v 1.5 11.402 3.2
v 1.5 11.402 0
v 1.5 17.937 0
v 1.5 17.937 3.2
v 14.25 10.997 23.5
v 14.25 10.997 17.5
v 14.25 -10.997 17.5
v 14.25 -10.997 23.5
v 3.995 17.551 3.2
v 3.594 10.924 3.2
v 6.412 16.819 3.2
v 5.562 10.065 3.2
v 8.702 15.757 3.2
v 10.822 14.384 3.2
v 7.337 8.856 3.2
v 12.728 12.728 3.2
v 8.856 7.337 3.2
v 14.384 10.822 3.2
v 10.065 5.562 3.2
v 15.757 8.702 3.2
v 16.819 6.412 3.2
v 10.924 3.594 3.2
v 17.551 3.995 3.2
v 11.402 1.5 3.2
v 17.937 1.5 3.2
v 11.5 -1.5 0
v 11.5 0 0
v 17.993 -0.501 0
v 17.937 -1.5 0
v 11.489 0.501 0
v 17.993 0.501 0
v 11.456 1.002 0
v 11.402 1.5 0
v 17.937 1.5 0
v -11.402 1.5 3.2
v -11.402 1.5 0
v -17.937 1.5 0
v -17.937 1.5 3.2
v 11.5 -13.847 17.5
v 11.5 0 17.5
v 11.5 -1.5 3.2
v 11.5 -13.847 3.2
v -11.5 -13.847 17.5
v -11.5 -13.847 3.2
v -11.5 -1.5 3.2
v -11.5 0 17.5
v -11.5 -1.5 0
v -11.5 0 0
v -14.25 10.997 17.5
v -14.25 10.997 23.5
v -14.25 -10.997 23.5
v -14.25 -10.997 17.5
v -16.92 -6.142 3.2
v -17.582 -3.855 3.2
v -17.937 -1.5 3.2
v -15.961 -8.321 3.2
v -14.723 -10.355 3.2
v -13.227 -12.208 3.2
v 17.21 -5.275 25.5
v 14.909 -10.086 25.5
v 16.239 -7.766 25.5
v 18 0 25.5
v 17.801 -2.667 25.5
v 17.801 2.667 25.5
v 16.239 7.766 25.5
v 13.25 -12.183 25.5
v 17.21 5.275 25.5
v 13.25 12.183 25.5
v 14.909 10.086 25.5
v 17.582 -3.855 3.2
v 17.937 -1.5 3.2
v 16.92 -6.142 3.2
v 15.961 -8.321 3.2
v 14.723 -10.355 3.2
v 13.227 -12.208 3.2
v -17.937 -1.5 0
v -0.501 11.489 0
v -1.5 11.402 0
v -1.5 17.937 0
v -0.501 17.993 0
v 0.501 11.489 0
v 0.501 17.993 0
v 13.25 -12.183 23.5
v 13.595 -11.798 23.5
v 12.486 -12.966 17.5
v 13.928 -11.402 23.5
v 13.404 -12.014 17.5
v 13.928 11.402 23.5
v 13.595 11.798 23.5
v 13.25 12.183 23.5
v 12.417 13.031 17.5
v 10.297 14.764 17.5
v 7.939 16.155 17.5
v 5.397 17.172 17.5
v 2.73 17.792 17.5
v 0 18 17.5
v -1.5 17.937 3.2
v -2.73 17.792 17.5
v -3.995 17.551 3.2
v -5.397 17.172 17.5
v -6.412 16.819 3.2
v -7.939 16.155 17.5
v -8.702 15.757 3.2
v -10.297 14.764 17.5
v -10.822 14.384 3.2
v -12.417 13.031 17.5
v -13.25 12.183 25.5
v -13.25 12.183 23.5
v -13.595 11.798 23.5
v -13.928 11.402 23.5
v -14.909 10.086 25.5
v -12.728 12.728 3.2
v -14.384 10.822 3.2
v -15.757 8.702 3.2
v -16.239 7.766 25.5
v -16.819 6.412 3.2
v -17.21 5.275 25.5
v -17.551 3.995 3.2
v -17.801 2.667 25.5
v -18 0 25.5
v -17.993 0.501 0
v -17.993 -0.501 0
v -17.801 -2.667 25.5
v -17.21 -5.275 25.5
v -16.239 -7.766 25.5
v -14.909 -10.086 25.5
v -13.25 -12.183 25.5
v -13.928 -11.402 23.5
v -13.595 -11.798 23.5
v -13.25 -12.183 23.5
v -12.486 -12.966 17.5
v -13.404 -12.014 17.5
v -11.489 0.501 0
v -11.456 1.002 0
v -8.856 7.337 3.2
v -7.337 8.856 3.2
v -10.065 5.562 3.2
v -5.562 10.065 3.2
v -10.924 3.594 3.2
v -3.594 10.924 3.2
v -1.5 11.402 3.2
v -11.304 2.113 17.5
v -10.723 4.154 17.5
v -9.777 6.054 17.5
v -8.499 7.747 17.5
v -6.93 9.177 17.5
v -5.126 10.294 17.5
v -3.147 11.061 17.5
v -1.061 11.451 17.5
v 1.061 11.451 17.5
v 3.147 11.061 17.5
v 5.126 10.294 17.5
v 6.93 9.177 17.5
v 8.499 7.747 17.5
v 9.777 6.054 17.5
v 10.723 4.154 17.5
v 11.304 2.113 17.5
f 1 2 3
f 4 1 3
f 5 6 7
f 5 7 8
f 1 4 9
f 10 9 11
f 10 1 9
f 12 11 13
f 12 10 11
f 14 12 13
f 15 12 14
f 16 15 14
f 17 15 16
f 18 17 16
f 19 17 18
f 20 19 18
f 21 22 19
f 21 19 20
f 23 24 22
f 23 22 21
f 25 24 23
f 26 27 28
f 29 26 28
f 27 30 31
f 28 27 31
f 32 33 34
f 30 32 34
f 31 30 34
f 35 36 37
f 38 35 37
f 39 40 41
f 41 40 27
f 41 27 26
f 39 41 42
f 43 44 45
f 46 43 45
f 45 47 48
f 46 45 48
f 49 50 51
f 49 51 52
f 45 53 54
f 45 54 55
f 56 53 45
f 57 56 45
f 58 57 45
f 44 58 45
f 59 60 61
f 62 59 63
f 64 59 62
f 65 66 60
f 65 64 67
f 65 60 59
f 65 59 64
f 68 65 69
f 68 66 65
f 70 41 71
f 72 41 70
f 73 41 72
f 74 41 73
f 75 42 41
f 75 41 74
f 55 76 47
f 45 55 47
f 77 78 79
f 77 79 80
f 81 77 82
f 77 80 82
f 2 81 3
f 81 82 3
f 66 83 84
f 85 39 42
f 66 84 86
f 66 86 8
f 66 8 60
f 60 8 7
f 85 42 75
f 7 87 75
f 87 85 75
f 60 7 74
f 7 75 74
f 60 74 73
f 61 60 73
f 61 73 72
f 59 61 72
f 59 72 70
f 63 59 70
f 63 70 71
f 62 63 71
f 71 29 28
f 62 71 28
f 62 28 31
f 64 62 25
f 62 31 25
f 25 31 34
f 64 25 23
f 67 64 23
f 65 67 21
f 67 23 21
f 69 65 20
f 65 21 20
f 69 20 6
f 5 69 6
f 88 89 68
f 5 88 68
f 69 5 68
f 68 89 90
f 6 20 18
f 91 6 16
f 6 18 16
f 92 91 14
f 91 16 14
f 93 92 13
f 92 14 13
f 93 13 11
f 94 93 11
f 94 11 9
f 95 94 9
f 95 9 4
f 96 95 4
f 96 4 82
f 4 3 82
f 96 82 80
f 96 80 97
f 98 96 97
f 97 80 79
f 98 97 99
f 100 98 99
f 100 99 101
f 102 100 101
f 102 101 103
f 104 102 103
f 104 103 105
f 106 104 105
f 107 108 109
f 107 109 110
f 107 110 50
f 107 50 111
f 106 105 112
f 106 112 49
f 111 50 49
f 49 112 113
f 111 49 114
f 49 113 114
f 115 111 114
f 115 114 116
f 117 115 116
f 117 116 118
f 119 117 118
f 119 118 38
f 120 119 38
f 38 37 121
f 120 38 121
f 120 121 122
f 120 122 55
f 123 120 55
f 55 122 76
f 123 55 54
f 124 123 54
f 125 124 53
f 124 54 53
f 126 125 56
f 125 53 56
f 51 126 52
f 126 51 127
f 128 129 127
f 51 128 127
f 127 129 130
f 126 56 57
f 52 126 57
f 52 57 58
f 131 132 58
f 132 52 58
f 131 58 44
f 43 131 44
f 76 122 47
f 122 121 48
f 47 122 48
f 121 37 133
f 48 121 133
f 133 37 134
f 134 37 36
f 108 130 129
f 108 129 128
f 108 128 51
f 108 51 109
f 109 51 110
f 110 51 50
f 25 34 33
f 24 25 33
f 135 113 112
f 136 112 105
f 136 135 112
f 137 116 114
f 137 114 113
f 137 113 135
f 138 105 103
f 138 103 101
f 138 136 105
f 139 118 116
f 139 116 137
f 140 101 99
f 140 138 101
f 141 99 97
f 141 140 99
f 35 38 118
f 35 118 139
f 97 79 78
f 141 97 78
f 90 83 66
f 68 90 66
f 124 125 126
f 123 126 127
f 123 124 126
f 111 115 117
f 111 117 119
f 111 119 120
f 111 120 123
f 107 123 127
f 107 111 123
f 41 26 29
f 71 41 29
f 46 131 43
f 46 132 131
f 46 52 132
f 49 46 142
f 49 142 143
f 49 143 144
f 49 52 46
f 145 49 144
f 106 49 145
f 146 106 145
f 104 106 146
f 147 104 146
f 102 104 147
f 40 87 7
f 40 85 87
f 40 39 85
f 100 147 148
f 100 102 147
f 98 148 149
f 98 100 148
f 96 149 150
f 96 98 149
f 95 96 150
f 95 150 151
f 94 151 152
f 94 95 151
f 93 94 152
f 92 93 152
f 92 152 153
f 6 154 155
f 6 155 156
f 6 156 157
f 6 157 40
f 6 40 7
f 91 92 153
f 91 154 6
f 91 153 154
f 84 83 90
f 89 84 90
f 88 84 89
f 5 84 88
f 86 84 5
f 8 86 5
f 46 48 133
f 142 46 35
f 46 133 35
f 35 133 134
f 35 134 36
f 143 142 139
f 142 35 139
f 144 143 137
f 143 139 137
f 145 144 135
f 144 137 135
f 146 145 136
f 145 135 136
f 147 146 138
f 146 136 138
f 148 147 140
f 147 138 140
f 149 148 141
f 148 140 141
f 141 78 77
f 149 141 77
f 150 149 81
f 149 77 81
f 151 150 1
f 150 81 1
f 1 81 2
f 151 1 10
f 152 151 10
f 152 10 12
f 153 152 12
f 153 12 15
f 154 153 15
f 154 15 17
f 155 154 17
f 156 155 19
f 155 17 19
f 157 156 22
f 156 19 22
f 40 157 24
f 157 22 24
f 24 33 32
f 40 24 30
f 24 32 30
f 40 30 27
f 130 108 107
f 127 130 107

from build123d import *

# Parameters (mm, degrees)
F1_DEPTH = 25.5
F2_W     = 26.5
F2_H     = 2
F3_DEPTH = 18.001
F4_DEPTH = 13.848382
F6_DEPTH = 3.2


with BuildPart() as f1:
    # F0 (on Top) → F1 (new body)
    with BuildSketch(Plane.XY):
        with BuildLine():
            Line((11.5, 0), (11.5, -13.847382))
            ThreePointArc((11.5, -13.847382), (0, 18), (-11.5, -13.847382))
            Line((-11.5, -13.847382), (-11.5, 0))
            ThreePointArc((-11.5, 0), (0, 11.5), (11.5, 0))
        make_face()
    extrude(amount=F1_DEPTH)

    # F2 (on Front) → F3 (cut, through all)
    with BuildSketch(Plane.XZ):
        Polygon((-13.25, 23.5), (-14.25, 23.5), (-14.25, 17.5), (14.25, 17.5), (14.25, 23.5), (13.25, 23.5), align=None)
        with Locations((0, 24.5)):
            Rectangle(F2_W, F2_H)
    extrude(amount=-F3_DEPTH, mode=Mode.SUBTRACT)

    # F2 (on Front) → F4 (cut, through all)
    with BuildSketch(Plane.XZ):
        Polygon((-13.25, 23.5), (-14.25, 23.5), (-14.25, 17.5), (14.25, 17.5), (14.25, 23.5), (13.25, 23.5), align=None)
        with Locations((0, 24.5)):
            Rectangle(F2_W, F2_H)
    extrude(amount=F4_DEPTH, mode=Mode.SUBTRACT)

    # F5 (on face) → F6 (cut)
    with BuildSketch(Plane(origin=(0, 0, 0), x_dir=(1, 0, 0), z_dir=(0, 0, -1))):
        with BuildLine():
            ThreePointArc((-11.5, 13.847382), (-15.961029, 8.32139), (-17.937391, 1.5))
            Line((-17.937391, 1.5), (-11.5, 1.5))
            Line((-11.5, 1.5), (-11.5, 13.847382))
        make_face()
        with BuildLine():
            ThreePointArc((-17.937391, -1.5), (-12.727922, -12.727922), (-1.5, -17.937391))
            Line((-1.5, -17.937391), (-1.5, -11.401754))
            ThreePointArc((-1.5, -11.401754), (-8.131728, -8.131728), (-11.401754, -1.5))
            Line((-11.401754, -1.5), (-17.937391, -1.5))
        make_face()
        with BuildLine():
            Line((1.5, -11.401754), (1.5, -17.937391))
            ThreePointArc((1.5, -17.937391), (12.727922, -12.727922), (17.937391, -1.5))
            Line((17.937391, -1.5), (11.401754, -1.5))
            ThreePointArc((11.401754, -1.5), (8.131728, -8.131728), (1.5, -11.401754))
        make_face()
        with BuildLine():
            Line((11.5, 1.5), (17.937391, 1.5))
            ThreePointArc((17.937391, 1.5), (15.961029, 8.32139), (11.5, 13.847382))
            Line((11.5, 13.847382), (11.5, 1.5))
        make_face()
    extrude(amount=-F6_DEPTH, mode=Mode.SUBTRACT)


solid = f1.part
